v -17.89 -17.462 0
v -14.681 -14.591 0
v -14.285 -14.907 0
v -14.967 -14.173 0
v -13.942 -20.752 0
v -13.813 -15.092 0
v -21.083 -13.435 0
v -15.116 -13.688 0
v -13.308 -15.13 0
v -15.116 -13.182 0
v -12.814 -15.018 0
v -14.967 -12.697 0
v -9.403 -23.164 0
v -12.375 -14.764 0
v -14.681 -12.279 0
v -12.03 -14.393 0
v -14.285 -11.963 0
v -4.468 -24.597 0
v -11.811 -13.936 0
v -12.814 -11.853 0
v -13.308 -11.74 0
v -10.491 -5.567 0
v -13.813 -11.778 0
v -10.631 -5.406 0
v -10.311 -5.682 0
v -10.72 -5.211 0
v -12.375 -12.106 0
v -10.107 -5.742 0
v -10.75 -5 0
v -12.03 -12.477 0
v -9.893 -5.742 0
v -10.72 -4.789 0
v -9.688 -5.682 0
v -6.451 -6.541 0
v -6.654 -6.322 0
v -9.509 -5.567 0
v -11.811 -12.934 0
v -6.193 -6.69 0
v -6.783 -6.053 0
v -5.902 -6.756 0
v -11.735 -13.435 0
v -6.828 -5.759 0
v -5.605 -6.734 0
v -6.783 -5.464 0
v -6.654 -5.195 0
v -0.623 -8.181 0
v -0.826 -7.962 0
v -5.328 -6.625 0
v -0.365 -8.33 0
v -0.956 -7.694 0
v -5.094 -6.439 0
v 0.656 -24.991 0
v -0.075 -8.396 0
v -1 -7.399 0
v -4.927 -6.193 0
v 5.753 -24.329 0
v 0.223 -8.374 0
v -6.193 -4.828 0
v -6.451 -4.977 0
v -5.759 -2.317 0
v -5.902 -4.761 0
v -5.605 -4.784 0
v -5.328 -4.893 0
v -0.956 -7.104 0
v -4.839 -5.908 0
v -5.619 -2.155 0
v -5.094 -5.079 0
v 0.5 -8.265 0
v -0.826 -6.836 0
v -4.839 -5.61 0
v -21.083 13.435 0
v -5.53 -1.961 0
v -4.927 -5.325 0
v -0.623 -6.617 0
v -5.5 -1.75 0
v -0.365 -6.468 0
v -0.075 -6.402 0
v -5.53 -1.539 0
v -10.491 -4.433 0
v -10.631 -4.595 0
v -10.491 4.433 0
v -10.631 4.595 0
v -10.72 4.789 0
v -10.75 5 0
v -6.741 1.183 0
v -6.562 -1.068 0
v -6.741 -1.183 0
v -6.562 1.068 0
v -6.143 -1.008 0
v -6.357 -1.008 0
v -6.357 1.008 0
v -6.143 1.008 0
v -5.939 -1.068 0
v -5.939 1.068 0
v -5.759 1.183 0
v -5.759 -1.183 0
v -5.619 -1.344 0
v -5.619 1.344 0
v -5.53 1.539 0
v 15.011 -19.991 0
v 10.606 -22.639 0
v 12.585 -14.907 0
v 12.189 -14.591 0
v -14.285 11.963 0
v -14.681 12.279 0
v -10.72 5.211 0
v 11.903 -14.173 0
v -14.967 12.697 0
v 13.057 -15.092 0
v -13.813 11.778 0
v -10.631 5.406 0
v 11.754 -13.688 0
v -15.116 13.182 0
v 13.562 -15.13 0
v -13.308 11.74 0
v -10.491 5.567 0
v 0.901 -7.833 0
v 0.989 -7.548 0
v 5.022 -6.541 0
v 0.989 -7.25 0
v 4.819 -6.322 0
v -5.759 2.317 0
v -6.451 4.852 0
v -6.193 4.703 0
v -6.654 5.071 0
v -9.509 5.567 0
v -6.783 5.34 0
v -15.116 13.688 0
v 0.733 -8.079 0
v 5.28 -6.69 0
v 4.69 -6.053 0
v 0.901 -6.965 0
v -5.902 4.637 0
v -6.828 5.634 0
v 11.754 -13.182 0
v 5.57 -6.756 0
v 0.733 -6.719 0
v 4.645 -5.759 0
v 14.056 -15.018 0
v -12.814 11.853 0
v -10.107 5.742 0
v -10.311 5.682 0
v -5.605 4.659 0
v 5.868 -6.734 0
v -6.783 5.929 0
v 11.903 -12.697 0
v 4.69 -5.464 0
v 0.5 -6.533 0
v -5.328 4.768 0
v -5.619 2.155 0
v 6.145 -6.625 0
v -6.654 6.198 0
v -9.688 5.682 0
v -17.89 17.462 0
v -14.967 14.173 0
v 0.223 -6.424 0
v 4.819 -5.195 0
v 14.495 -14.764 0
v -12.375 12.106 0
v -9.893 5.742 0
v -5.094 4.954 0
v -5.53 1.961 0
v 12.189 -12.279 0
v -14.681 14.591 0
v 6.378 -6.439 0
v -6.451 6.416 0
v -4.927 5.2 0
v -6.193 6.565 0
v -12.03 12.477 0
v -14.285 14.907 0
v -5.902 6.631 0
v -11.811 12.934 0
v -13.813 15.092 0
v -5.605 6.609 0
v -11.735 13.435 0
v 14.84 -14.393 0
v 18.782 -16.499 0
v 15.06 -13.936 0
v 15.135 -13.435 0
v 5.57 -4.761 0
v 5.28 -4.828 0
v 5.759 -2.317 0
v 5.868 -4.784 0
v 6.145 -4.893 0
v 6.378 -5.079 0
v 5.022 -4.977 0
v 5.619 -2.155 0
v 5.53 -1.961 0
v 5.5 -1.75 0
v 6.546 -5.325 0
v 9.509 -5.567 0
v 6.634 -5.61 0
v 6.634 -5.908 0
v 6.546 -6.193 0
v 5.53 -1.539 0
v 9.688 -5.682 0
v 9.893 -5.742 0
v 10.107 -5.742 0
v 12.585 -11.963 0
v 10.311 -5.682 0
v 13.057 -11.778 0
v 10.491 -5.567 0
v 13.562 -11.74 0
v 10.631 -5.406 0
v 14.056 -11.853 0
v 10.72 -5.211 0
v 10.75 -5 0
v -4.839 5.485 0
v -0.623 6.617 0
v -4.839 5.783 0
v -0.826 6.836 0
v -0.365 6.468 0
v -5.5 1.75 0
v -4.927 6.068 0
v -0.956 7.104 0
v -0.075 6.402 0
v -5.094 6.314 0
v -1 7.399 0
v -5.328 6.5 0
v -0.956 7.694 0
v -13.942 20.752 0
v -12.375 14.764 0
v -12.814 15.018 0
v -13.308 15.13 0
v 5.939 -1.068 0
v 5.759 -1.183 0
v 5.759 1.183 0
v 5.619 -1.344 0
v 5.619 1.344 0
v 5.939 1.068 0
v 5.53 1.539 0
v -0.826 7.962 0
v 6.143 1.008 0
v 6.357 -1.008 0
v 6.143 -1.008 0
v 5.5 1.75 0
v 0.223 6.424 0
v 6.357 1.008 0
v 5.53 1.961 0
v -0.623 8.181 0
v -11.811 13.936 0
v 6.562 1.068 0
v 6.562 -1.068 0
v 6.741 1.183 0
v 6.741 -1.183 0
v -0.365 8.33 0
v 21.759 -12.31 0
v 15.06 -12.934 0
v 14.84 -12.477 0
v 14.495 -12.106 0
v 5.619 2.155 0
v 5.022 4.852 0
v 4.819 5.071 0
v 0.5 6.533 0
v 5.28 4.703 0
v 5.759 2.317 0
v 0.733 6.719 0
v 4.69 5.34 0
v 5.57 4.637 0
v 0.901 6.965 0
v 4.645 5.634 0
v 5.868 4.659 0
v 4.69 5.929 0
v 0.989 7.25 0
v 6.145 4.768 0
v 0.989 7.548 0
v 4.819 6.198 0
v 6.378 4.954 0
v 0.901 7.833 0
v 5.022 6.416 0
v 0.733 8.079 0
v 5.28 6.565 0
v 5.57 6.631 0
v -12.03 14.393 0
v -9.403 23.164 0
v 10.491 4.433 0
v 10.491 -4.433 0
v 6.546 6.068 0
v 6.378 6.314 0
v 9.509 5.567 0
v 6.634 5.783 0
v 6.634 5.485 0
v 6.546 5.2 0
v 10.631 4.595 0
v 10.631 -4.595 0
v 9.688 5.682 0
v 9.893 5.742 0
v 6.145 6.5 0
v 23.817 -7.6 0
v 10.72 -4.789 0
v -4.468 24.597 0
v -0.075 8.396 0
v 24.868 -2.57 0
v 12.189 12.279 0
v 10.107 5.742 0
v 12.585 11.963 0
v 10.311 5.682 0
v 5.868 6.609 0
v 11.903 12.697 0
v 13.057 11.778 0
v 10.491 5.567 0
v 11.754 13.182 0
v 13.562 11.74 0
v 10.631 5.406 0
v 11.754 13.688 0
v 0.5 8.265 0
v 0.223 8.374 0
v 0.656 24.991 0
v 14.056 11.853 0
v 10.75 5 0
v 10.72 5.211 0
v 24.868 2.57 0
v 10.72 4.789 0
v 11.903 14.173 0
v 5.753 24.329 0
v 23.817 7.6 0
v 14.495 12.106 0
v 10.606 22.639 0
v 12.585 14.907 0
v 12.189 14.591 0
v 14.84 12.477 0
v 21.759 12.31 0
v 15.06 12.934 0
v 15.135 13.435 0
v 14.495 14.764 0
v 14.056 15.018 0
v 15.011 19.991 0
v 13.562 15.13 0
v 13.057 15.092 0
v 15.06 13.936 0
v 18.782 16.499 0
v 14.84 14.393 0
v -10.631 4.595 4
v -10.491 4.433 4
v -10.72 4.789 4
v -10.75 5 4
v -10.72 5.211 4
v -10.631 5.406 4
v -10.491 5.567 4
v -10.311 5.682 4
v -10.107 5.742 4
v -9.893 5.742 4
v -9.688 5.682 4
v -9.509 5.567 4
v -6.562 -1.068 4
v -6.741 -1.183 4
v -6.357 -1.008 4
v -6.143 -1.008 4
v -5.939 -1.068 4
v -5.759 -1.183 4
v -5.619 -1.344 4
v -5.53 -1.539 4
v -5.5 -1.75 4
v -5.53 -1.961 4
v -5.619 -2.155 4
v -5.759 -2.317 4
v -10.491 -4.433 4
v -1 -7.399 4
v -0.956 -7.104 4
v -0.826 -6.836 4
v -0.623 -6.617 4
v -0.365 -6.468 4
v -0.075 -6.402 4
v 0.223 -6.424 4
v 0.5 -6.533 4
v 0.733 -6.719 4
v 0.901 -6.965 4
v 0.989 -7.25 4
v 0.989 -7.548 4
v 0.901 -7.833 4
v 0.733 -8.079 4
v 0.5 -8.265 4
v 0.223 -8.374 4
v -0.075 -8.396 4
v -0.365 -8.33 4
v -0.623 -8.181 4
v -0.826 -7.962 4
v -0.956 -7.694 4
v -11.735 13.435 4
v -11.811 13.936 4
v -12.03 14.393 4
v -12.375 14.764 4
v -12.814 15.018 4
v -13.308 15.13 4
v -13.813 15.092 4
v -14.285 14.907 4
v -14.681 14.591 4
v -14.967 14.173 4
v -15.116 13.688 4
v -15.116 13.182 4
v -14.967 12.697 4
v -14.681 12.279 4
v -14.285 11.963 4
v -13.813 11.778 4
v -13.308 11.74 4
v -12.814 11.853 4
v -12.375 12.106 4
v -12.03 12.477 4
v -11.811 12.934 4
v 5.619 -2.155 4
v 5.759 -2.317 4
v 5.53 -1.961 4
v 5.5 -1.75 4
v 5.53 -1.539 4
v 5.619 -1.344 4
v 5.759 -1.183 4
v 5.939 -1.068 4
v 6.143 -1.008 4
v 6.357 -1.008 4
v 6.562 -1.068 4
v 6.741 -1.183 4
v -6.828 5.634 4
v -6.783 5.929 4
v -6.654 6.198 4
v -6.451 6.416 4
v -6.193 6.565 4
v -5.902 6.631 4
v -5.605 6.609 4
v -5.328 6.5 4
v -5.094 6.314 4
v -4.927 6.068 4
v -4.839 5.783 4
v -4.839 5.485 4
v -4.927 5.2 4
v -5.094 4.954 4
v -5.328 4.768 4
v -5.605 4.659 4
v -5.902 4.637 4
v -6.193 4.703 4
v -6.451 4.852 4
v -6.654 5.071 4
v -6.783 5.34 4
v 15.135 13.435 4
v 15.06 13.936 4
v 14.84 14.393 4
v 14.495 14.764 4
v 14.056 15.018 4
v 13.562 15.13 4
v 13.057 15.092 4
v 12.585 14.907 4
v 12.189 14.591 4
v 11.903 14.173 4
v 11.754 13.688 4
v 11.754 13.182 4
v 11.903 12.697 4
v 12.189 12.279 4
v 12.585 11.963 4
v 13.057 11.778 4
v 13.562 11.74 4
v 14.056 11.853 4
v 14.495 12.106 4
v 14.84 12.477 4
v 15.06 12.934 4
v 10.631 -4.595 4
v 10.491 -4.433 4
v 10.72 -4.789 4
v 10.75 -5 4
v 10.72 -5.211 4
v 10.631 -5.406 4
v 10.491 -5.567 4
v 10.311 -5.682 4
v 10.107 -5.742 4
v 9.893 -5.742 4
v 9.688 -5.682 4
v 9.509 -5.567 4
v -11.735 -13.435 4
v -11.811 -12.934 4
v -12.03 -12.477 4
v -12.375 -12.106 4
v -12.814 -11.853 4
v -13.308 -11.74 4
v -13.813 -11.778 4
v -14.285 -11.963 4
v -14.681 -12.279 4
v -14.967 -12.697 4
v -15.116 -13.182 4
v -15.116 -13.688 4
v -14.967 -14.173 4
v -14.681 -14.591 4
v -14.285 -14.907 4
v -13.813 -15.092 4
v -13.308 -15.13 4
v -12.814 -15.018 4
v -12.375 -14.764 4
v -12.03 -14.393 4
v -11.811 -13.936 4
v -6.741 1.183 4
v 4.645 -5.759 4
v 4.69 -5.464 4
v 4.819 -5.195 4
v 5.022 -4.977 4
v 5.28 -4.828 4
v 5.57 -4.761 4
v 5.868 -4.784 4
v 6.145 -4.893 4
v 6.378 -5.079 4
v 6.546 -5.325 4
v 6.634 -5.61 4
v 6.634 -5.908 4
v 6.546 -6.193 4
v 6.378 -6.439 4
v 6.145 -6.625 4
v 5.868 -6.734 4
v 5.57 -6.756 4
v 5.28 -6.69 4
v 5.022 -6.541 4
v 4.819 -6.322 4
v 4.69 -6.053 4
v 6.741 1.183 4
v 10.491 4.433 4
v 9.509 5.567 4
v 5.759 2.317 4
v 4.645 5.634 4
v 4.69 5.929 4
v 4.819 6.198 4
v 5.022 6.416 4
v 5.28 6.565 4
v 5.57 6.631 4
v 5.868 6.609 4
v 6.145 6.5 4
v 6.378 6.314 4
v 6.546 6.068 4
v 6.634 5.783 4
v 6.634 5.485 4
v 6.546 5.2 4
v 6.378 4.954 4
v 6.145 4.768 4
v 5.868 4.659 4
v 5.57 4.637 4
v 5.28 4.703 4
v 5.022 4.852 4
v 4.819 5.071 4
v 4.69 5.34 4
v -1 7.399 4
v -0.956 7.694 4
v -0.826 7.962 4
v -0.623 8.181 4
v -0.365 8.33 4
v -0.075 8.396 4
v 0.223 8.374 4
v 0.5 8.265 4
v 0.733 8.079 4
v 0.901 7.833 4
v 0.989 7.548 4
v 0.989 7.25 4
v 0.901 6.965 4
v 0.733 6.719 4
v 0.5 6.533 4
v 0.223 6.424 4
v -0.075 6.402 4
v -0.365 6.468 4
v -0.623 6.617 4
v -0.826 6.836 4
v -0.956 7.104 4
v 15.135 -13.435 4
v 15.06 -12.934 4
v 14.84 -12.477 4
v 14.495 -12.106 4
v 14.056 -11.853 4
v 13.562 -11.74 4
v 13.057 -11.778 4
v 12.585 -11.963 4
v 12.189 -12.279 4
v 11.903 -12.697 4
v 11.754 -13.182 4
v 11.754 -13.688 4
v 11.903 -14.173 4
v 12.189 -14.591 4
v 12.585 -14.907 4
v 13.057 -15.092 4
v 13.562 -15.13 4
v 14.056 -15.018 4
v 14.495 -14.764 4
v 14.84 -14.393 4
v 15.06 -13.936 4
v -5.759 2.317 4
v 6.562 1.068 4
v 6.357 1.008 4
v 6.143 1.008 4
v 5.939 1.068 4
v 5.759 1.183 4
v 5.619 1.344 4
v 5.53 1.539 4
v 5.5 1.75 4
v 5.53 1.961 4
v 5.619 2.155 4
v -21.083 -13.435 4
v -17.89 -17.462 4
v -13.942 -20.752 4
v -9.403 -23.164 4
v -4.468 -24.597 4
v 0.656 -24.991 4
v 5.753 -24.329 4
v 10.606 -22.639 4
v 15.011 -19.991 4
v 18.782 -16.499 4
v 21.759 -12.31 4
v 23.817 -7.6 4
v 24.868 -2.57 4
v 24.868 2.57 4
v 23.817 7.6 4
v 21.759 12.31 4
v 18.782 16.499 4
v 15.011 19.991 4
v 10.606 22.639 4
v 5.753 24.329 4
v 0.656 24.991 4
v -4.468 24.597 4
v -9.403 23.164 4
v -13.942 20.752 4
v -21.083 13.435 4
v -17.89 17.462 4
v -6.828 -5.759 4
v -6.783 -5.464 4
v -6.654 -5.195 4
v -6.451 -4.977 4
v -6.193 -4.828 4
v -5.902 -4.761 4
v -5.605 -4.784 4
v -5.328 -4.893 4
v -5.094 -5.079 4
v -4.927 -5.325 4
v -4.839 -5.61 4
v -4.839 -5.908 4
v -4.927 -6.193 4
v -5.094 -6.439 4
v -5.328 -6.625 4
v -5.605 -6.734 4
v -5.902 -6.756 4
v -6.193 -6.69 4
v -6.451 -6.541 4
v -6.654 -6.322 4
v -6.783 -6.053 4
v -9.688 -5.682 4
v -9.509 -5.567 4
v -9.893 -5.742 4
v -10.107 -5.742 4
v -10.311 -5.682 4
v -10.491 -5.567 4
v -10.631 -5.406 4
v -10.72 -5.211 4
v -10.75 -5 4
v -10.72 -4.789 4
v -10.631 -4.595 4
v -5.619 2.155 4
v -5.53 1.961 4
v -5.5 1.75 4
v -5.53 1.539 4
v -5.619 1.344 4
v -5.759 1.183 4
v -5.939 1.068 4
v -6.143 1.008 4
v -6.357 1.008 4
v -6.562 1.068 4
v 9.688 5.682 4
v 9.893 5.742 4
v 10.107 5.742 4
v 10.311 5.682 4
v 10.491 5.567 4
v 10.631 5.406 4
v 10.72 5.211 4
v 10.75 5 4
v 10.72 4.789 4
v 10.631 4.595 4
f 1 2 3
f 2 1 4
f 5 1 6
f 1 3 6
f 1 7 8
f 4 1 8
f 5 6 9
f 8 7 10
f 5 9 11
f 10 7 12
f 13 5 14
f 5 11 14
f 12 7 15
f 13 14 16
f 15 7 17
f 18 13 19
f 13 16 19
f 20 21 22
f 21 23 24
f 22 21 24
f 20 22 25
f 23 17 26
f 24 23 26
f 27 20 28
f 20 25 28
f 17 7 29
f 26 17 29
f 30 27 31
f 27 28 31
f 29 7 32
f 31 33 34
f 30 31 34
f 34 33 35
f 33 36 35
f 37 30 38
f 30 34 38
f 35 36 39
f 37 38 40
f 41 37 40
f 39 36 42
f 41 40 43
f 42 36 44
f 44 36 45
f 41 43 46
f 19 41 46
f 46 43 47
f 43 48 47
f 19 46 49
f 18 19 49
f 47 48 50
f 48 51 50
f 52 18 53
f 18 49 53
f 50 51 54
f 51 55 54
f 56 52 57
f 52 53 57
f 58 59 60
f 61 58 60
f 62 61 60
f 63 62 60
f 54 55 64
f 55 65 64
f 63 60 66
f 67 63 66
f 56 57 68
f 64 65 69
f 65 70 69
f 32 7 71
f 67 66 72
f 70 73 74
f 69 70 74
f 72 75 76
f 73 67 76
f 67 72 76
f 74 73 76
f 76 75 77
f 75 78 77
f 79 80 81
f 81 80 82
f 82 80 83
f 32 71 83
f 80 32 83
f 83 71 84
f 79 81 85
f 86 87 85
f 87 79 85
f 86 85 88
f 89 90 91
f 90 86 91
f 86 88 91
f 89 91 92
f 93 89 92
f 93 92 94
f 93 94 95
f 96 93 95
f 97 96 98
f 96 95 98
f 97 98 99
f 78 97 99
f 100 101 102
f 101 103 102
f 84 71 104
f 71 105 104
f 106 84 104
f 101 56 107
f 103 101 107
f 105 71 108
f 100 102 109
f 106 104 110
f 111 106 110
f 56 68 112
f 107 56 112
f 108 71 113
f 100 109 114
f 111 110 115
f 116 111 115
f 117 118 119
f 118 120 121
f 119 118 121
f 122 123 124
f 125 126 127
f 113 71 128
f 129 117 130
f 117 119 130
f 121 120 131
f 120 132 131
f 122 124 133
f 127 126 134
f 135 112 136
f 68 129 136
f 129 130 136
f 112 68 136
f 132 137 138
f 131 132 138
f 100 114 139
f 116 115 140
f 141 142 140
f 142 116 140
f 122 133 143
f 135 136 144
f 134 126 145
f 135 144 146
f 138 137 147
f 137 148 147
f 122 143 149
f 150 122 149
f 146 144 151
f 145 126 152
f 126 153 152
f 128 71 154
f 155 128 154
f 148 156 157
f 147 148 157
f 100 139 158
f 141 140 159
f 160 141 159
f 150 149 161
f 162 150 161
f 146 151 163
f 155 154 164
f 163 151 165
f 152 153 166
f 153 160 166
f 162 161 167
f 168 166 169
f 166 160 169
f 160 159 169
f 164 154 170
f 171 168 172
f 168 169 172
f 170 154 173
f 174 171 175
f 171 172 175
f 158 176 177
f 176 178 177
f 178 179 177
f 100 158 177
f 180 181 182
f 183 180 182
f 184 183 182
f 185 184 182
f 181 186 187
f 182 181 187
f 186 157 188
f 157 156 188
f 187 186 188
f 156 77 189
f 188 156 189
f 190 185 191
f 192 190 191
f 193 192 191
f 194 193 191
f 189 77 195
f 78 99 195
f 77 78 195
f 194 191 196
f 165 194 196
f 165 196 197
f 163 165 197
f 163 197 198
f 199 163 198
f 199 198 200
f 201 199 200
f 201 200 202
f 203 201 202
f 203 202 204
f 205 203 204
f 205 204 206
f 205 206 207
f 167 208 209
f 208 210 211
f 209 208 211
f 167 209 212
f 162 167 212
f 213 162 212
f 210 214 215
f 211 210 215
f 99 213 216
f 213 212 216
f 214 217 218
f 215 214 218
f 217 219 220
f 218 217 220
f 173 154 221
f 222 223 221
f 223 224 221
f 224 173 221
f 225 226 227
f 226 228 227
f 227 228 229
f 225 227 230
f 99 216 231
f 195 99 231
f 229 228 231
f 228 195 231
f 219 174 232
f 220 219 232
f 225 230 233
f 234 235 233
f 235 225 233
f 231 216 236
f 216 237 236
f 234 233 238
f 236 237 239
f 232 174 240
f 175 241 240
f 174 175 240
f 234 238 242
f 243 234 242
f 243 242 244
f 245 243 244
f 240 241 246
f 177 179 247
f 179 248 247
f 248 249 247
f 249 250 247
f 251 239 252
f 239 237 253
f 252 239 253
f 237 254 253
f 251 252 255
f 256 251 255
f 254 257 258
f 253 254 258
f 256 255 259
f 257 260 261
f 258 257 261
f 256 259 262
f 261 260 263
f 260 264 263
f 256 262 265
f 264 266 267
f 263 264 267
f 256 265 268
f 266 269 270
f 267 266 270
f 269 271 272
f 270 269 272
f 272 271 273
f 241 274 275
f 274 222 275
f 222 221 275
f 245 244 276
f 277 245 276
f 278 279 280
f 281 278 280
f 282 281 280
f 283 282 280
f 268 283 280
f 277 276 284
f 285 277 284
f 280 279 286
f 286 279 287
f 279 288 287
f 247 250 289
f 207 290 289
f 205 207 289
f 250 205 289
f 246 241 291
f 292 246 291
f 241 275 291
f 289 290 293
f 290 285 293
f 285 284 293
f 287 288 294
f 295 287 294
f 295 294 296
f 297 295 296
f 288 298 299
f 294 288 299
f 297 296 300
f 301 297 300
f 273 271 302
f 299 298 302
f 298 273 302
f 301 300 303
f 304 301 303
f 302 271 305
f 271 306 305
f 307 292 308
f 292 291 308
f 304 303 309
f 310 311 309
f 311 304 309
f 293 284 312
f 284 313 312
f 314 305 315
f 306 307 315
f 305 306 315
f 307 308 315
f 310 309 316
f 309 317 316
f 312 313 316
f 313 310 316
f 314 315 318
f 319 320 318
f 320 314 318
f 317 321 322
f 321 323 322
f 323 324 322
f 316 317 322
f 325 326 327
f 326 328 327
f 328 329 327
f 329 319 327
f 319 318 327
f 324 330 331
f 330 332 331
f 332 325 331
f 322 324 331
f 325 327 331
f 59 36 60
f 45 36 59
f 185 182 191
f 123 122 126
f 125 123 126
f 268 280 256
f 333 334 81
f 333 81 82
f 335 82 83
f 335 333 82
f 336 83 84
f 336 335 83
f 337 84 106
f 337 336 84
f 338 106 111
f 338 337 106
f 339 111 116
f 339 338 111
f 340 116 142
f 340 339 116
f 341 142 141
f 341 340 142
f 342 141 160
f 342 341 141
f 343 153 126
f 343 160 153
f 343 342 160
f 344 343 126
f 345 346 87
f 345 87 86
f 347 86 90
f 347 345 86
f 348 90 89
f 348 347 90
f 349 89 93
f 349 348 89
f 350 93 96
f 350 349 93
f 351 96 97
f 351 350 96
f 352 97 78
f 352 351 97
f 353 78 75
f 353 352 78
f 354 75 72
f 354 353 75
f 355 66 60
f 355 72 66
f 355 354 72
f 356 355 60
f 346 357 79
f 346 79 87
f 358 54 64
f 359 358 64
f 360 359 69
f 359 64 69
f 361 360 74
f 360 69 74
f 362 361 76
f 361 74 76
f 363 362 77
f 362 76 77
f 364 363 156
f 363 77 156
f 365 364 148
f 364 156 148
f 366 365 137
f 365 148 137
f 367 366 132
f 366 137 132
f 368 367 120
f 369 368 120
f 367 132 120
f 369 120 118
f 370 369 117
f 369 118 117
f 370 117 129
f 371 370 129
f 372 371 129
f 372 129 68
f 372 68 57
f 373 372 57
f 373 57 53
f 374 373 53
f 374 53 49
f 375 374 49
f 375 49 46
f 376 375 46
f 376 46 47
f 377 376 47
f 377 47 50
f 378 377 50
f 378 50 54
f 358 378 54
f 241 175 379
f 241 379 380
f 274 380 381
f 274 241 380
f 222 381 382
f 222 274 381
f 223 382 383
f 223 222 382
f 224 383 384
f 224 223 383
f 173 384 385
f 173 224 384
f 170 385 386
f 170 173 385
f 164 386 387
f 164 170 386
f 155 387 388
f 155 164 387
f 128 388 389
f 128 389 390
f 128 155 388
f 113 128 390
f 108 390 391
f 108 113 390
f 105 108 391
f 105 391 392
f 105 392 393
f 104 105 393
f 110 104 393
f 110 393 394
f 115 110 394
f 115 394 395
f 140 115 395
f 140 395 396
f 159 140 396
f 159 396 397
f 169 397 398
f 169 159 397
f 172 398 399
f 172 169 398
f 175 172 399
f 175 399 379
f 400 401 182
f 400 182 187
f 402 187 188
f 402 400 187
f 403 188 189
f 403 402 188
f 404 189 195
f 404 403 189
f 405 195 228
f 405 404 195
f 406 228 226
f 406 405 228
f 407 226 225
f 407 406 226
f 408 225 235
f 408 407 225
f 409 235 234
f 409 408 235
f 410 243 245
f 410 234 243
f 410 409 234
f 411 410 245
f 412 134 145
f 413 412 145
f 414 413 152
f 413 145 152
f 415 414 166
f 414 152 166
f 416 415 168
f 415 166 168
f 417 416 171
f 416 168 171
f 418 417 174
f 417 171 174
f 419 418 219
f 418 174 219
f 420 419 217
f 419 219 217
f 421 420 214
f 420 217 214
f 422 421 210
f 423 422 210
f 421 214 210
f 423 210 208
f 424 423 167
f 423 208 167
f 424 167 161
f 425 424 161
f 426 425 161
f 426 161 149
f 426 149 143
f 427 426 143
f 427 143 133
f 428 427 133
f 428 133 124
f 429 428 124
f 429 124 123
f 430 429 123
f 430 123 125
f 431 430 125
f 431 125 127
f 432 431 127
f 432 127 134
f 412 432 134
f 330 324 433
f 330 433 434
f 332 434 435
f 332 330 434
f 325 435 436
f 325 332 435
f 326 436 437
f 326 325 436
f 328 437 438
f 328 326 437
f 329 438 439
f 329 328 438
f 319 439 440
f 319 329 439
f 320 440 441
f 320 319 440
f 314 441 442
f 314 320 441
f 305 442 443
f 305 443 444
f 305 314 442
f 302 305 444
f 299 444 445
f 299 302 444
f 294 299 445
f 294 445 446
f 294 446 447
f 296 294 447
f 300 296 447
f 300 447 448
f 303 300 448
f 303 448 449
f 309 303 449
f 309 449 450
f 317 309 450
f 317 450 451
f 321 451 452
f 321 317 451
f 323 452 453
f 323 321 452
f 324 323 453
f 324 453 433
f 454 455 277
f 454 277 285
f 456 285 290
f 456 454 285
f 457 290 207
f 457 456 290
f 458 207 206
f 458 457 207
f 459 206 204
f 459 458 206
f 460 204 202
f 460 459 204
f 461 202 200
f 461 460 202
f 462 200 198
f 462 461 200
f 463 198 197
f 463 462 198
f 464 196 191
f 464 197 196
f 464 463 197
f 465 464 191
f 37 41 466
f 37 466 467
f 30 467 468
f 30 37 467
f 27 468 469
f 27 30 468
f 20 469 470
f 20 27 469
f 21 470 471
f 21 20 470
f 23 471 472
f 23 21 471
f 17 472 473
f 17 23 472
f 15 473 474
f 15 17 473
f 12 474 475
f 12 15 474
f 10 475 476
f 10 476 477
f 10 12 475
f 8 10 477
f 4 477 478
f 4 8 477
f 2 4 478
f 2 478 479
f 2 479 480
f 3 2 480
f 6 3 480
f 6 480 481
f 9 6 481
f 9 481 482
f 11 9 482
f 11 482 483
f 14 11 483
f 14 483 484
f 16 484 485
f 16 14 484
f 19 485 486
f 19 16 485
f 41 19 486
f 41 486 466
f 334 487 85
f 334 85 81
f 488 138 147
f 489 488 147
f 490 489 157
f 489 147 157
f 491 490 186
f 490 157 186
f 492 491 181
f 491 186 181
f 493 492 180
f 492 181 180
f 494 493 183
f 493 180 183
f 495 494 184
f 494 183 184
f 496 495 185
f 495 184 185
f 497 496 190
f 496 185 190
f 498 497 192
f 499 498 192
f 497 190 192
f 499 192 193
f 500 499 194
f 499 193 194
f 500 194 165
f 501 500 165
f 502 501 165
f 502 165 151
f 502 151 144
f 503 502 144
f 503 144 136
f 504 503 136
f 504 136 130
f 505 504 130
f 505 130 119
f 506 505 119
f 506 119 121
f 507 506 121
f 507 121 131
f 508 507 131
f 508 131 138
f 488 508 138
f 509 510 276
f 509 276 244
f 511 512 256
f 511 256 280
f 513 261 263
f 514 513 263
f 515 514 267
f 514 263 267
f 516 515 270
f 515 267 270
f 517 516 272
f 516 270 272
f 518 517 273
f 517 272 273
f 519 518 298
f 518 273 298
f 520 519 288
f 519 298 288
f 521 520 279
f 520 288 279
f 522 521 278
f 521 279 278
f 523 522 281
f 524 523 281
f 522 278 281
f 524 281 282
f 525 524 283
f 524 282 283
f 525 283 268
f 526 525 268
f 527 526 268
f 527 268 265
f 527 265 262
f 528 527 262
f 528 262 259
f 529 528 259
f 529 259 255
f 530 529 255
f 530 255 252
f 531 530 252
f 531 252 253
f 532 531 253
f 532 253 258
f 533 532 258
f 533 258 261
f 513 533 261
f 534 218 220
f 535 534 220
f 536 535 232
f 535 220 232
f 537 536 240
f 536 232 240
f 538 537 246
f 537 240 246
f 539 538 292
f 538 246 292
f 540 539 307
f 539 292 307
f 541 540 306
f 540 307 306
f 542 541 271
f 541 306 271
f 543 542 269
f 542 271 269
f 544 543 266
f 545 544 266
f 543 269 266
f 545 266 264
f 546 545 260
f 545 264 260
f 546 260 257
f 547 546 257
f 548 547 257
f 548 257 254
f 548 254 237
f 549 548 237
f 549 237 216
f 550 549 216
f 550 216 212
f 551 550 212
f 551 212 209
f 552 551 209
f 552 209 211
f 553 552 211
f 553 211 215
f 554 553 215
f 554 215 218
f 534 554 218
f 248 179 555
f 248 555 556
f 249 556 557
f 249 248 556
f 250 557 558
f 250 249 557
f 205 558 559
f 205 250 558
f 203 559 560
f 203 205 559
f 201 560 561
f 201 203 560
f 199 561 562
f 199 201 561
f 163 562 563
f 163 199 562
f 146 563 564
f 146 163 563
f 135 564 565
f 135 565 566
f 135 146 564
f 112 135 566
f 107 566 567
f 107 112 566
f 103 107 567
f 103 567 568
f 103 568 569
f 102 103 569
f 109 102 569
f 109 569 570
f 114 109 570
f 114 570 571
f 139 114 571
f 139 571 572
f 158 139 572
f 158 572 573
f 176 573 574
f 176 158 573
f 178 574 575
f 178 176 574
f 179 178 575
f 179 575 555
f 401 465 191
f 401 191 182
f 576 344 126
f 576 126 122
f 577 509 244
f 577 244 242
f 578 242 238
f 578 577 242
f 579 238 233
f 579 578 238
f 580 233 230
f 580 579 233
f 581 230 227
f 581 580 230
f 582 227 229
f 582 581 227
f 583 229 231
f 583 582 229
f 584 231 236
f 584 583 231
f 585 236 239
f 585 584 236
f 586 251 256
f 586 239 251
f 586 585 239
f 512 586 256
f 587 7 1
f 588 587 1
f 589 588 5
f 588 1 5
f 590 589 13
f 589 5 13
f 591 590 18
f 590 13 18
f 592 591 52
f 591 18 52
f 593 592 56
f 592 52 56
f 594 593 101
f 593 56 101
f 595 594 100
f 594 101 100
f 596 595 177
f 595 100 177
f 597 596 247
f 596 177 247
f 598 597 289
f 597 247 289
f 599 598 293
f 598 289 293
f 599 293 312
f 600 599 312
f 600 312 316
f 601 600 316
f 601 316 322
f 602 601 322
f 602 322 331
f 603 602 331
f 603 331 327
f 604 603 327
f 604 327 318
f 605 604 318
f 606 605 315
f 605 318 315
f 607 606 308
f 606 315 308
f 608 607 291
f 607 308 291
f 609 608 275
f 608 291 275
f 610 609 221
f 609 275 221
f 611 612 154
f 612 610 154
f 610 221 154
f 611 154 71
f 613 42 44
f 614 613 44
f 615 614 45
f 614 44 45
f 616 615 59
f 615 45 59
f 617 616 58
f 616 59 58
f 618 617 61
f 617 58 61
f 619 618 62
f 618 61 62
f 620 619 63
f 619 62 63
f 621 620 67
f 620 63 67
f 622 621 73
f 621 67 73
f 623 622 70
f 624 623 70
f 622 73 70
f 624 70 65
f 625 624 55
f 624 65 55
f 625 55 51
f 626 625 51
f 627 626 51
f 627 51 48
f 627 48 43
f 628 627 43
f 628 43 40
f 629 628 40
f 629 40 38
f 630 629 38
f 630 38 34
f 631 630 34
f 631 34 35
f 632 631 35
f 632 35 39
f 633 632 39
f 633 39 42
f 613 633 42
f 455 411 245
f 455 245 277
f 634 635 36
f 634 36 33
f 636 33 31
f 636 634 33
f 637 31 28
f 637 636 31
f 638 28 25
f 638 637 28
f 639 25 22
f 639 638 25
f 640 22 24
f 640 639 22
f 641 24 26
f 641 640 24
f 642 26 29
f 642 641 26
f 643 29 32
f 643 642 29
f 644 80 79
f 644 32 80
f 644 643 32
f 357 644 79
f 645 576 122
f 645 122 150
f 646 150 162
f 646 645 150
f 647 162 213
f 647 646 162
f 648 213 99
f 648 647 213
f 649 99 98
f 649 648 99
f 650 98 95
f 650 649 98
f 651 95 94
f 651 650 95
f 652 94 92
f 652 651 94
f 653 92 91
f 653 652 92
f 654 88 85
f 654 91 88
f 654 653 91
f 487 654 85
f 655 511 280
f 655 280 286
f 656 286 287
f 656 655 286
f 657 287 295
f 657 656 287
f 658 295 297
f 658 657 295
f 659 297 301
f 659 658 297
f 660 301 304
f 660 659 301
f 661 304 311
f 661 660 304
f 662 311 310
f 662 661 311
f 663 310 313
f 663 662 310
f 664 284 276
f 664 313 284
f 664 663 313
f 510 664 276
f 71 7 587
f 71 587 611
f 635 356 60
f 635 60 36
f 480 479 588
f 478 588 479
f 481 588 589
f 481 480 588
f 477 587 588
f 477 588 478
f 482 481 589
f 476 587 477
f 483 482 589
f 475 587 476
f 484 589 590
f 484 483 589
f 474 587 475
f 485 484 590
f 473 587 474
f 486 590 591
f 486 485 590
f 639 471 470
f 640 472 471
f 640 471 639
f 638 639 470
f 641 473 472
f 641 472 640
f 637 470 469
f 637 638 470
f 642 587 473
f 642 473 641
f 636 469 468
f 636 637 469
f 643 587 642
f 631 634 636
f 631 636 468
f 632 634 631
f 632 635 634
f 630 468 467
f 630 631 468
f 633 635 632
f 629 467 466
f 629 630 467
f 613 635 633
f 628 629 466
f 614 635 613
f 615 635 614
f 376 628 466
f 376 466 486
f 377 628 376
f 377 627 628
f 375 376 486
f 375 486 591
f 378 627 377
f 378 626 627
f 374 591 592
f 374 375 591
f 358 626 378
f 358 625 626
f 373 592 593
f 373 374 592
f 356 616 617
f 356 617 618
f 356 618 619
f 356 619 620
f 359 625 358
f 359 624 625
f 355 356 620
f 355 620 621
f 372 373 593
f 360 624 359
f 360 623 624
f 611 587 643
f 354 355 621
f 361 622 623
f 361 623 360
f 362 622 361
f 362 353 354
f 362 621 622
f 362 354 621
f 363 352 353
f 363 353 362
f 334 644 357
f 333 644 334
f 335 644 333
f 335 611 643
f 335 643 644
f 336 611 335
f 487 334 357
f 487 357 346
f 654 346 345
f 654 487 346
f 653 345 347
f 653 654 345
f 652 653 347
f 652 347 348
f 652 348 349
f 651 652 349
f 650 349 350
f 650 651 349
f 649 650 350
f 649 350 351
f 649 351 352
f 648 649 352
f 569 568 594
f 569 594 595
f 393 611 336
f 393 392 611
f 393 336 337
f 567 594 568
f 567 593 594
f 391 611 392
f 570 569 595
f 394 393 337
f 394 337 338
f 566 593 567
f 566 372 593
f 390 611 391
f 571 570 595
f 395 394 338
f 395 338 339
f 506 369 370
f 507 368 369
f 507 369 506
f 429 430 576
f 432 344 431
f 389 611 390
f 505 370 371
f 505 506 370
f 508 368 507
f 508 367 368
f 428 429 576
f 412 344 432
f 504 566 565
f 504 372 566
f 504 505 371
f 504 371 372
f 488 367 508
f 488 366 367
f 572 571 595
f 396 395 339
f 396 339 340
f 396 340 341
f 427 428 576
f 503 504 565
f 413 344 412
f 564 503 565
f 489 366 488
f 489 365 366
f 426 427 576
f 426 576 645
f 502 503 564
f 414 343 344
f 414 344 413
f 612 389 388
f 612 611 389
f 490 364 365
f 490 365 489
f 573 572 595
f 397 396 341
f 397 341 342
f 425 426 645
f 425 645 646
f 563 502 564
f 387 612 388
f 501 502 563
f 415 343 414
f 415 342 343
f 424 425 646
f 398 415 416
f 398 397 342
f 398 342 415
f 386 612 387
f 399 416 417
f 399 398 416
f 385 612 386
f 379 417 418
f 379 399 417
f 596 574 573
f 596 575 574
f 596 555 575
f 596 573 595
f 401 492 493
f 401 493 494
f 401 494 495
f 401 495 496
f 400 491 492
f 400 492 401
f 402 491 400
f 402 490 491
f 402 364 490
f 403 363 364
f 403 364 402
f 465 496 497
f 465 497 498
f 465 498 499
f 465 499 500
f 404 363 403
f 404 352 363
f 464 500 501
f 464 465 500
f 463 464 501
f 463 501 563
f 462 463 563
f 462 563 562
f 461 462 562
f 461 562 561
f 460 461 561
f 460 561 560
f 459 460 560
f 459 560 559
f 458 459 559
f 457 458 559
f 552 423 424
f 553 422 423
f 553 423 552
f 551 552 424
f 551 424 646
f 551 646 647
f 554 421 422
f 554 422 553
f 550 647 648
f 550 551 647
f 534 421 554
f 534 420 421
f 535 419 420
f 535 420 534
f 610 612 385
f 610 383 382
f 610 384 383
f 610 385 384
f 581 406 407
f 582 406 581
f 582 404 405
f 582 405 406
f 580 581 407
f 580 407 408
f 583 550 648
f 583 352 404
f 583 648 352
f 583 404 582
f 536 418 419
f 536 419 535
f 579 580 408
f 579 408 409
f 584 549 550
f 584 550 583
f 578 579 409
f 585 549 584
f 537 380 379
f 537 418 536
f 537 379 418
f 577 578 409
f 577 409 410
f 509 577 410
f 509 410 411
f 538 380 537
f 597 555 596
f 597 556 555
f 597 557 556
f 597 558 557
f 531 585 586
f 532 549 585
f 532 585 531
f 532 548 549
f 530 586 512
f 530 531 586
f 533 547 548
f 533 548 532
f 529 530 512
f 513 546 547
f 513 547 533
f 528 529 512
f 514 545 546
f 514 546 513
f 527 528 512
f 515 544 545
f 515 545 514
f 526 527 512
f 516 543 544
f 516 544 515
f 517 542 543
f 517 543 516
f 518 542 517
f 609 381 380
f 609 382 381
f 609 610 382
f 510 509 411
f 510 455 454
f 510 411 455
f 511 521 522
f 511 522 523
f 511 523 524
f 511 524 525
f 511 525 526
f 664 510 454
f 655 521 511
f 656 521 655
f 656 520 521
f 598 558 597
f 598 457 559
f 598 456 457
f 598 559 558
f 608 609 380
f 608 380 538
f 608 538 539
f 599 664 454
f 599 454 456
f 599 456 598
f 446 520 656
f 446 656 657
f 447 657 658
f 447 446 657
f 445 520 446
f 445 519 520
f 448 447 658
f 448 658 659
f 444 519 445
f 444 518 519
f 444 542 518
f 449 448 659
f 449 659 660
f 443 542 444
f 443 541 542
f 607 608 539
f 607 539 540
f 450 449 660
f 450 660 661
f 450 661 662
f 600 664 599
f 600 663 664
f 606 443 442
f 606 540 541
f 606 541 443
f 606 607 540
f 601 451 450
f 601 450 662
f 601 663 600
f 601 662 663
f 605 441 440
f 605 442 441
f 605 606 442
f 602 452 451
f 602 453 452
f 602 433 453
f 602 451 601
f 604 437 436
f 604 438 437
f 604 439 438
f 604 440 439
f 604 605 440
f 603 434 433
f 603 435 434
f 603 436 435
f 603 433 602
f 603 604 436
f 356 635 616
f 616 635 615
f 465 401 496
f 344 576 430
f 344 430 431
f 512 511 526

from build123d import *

# Parameters (mm, degrees)
ESQUISSE1_R             = 25
ESQUISSE1_R_2           = 1.7
BOSS_EXTRU_1_DEPTH      = 4
ESQUISSE11_R            = 1
ENL_V_MAT_EXTRU_1_DEPTH = 36.580893749
ESQUISSE13_W            = 4.903660669
ESQUISSE13_H            = 28.894120166
ENL_V_MAT_EXTRU_2_DEPTH = 36.580893749
ENL_V_MAT_EXTRU_3_DEPTH = 36.580893749


with BuildPart() as part:
    # Esquisse1 → Boss.-Extru.1 (new body)
    with BuildSketch(Plane.XY):
        Circle(ESQUISSE1_R)
        with Locations((-13.435028843, 13.435028843)):
            Circle(ESQUISSE1_R_2, mode=Mode.SUBTRACT)
        with Locations((13.435028843, 13.435028843)):
            Circle(ESQUISSE1_R_2, mode=Mode.SUBTRACT)
        with Locations((13.435028843, -13.435028843)):
            Circle(ESQUISSE1_R_2, mode=Mode.SUBTRACT)
        with Locations((-13.435028843, -13.435028843)):
            Circle(ESQUISSE1_R_2, mode=Mode.SUBTRACT)
    extrude(amount=BOSS_EXTRU_1_DEPTH)

    # Esquisse11 → Enlèv. mat.-Extru.1 (cut, through all)
    with BuildSketch(Plane(origin=(0, 0, 0), x_dir=(-1, 0, 0), z_dir=(0, 0, -1))):
        with Locations((0, 7.398882196)):
            Circle(ESQUISSE11_R)
        with Locations((5.827506735, 5.634287936)):
            Circle(ESQUISSE11_R)
        with Locations((5.827506735, -5.758693792)):
            Circle(ESQUISSE11_R)
        with Locations((0, -7.398882196)):
            Circle(ESQUISSE11_R)
        with Locations((-5.645080413, -5.758693792)):
            Circle(ESQUISSE11_R)
        with Locations((-5.645080413, 5.634287936)):
            Circle(ESQUISSE11_R)
    extrude(amount=-ENL_V_MAT_EXTRU_1_DEPTH, mode=Mode.SUBTRACT)

    # Esquisse13 → Enlèv. mat.-Extru.2 (cut, through all)
    with BuildSketch(Plane(origin=(0, 0, 0), x_dir=(-1, 0, 0), z_dir=(0, 0, -1))):
        with Locations((23.534998976, -1.01203124)):
            Rectangle(ESQUISSE13_W, ESQUISSE13_H)
    extrude(amount=-ENL_V_MAT_EXTRU_2_DEPTH, mode=Mode.SUBTRACT)

    # Esquisse10 → Enlèv. mat.-Extru.3 (cut, through all)
    with BuildSketch(Plane.XY.offset(4)):
        with BuildLine():
            Line((-5.758802096, -2.316766812), (-9.508802096, -5.566766812))
            ThreePointArc((-9.508802096, -5.566766812), (-10.566766812, -5.491197904), (-10.491197904, -4.433233188))
            Line((-10.491197904, -4.433233188), (-6.741197904, -1.183233188))
            ThreePointArc((-6.741197904, -1.183233188), (-5.683233188, -1.258802096), (-5.758802096, -2.316766812))
        make_face()
        with BuildLine():
            Line((-6.741197904, 1.183233188), (-10.491197904, 4.433233188))
            ThreePointArc((-10.491197904, 4.433233188), (-10.566766812, 5.491197904), (-9.508802096, 5.566766812))
            Line((-9.508802096, 5.566766812), (-5.758802096, 2.316766812))
            ThreePointArc((-5.758802096, 2.316766812), (-5.683233188, 1.258802096), (-6.741197904, 1.183233188))
        make_face()
        with BuildLine():
            Line((9.508802096, -5.566766812), (5.758802096, -2.316766812))
            ThreePointArc((5.758802096, -2.316766812), (5.683233188, -1.258802096), (6.741197904, -1.183233188))
            Line((6.741197904, -1.183233188), (10.491197904, -4.433233188))
            ThreePointArc((10.491197904, -4.433233188), (10.566766812, -5.491197904), (9.508802096, -5.566766812))
        make_face()
        with BuildLine():
            Line((10.491197904, 4.433233188), (6.741197904, 1.183233188))
            ThreePointArc((6.741197904, 1.183233188), (5.683233188, 1.258802096), (5.758802096, 2.316766812))
            Line((5.758802096, 2.316766812), (9.508802096, 5.566766812))
            ThreePointArc((9.508802096, 5.566766812), (10.566766812, 5.491197904), (10.491197904, 4.433233188))
        make_face()
    extrude(amount=-ENL_V_MAT_EXTRU_3_DEPTH, mode=Mode.SUBTRACT)


solid = part.part
